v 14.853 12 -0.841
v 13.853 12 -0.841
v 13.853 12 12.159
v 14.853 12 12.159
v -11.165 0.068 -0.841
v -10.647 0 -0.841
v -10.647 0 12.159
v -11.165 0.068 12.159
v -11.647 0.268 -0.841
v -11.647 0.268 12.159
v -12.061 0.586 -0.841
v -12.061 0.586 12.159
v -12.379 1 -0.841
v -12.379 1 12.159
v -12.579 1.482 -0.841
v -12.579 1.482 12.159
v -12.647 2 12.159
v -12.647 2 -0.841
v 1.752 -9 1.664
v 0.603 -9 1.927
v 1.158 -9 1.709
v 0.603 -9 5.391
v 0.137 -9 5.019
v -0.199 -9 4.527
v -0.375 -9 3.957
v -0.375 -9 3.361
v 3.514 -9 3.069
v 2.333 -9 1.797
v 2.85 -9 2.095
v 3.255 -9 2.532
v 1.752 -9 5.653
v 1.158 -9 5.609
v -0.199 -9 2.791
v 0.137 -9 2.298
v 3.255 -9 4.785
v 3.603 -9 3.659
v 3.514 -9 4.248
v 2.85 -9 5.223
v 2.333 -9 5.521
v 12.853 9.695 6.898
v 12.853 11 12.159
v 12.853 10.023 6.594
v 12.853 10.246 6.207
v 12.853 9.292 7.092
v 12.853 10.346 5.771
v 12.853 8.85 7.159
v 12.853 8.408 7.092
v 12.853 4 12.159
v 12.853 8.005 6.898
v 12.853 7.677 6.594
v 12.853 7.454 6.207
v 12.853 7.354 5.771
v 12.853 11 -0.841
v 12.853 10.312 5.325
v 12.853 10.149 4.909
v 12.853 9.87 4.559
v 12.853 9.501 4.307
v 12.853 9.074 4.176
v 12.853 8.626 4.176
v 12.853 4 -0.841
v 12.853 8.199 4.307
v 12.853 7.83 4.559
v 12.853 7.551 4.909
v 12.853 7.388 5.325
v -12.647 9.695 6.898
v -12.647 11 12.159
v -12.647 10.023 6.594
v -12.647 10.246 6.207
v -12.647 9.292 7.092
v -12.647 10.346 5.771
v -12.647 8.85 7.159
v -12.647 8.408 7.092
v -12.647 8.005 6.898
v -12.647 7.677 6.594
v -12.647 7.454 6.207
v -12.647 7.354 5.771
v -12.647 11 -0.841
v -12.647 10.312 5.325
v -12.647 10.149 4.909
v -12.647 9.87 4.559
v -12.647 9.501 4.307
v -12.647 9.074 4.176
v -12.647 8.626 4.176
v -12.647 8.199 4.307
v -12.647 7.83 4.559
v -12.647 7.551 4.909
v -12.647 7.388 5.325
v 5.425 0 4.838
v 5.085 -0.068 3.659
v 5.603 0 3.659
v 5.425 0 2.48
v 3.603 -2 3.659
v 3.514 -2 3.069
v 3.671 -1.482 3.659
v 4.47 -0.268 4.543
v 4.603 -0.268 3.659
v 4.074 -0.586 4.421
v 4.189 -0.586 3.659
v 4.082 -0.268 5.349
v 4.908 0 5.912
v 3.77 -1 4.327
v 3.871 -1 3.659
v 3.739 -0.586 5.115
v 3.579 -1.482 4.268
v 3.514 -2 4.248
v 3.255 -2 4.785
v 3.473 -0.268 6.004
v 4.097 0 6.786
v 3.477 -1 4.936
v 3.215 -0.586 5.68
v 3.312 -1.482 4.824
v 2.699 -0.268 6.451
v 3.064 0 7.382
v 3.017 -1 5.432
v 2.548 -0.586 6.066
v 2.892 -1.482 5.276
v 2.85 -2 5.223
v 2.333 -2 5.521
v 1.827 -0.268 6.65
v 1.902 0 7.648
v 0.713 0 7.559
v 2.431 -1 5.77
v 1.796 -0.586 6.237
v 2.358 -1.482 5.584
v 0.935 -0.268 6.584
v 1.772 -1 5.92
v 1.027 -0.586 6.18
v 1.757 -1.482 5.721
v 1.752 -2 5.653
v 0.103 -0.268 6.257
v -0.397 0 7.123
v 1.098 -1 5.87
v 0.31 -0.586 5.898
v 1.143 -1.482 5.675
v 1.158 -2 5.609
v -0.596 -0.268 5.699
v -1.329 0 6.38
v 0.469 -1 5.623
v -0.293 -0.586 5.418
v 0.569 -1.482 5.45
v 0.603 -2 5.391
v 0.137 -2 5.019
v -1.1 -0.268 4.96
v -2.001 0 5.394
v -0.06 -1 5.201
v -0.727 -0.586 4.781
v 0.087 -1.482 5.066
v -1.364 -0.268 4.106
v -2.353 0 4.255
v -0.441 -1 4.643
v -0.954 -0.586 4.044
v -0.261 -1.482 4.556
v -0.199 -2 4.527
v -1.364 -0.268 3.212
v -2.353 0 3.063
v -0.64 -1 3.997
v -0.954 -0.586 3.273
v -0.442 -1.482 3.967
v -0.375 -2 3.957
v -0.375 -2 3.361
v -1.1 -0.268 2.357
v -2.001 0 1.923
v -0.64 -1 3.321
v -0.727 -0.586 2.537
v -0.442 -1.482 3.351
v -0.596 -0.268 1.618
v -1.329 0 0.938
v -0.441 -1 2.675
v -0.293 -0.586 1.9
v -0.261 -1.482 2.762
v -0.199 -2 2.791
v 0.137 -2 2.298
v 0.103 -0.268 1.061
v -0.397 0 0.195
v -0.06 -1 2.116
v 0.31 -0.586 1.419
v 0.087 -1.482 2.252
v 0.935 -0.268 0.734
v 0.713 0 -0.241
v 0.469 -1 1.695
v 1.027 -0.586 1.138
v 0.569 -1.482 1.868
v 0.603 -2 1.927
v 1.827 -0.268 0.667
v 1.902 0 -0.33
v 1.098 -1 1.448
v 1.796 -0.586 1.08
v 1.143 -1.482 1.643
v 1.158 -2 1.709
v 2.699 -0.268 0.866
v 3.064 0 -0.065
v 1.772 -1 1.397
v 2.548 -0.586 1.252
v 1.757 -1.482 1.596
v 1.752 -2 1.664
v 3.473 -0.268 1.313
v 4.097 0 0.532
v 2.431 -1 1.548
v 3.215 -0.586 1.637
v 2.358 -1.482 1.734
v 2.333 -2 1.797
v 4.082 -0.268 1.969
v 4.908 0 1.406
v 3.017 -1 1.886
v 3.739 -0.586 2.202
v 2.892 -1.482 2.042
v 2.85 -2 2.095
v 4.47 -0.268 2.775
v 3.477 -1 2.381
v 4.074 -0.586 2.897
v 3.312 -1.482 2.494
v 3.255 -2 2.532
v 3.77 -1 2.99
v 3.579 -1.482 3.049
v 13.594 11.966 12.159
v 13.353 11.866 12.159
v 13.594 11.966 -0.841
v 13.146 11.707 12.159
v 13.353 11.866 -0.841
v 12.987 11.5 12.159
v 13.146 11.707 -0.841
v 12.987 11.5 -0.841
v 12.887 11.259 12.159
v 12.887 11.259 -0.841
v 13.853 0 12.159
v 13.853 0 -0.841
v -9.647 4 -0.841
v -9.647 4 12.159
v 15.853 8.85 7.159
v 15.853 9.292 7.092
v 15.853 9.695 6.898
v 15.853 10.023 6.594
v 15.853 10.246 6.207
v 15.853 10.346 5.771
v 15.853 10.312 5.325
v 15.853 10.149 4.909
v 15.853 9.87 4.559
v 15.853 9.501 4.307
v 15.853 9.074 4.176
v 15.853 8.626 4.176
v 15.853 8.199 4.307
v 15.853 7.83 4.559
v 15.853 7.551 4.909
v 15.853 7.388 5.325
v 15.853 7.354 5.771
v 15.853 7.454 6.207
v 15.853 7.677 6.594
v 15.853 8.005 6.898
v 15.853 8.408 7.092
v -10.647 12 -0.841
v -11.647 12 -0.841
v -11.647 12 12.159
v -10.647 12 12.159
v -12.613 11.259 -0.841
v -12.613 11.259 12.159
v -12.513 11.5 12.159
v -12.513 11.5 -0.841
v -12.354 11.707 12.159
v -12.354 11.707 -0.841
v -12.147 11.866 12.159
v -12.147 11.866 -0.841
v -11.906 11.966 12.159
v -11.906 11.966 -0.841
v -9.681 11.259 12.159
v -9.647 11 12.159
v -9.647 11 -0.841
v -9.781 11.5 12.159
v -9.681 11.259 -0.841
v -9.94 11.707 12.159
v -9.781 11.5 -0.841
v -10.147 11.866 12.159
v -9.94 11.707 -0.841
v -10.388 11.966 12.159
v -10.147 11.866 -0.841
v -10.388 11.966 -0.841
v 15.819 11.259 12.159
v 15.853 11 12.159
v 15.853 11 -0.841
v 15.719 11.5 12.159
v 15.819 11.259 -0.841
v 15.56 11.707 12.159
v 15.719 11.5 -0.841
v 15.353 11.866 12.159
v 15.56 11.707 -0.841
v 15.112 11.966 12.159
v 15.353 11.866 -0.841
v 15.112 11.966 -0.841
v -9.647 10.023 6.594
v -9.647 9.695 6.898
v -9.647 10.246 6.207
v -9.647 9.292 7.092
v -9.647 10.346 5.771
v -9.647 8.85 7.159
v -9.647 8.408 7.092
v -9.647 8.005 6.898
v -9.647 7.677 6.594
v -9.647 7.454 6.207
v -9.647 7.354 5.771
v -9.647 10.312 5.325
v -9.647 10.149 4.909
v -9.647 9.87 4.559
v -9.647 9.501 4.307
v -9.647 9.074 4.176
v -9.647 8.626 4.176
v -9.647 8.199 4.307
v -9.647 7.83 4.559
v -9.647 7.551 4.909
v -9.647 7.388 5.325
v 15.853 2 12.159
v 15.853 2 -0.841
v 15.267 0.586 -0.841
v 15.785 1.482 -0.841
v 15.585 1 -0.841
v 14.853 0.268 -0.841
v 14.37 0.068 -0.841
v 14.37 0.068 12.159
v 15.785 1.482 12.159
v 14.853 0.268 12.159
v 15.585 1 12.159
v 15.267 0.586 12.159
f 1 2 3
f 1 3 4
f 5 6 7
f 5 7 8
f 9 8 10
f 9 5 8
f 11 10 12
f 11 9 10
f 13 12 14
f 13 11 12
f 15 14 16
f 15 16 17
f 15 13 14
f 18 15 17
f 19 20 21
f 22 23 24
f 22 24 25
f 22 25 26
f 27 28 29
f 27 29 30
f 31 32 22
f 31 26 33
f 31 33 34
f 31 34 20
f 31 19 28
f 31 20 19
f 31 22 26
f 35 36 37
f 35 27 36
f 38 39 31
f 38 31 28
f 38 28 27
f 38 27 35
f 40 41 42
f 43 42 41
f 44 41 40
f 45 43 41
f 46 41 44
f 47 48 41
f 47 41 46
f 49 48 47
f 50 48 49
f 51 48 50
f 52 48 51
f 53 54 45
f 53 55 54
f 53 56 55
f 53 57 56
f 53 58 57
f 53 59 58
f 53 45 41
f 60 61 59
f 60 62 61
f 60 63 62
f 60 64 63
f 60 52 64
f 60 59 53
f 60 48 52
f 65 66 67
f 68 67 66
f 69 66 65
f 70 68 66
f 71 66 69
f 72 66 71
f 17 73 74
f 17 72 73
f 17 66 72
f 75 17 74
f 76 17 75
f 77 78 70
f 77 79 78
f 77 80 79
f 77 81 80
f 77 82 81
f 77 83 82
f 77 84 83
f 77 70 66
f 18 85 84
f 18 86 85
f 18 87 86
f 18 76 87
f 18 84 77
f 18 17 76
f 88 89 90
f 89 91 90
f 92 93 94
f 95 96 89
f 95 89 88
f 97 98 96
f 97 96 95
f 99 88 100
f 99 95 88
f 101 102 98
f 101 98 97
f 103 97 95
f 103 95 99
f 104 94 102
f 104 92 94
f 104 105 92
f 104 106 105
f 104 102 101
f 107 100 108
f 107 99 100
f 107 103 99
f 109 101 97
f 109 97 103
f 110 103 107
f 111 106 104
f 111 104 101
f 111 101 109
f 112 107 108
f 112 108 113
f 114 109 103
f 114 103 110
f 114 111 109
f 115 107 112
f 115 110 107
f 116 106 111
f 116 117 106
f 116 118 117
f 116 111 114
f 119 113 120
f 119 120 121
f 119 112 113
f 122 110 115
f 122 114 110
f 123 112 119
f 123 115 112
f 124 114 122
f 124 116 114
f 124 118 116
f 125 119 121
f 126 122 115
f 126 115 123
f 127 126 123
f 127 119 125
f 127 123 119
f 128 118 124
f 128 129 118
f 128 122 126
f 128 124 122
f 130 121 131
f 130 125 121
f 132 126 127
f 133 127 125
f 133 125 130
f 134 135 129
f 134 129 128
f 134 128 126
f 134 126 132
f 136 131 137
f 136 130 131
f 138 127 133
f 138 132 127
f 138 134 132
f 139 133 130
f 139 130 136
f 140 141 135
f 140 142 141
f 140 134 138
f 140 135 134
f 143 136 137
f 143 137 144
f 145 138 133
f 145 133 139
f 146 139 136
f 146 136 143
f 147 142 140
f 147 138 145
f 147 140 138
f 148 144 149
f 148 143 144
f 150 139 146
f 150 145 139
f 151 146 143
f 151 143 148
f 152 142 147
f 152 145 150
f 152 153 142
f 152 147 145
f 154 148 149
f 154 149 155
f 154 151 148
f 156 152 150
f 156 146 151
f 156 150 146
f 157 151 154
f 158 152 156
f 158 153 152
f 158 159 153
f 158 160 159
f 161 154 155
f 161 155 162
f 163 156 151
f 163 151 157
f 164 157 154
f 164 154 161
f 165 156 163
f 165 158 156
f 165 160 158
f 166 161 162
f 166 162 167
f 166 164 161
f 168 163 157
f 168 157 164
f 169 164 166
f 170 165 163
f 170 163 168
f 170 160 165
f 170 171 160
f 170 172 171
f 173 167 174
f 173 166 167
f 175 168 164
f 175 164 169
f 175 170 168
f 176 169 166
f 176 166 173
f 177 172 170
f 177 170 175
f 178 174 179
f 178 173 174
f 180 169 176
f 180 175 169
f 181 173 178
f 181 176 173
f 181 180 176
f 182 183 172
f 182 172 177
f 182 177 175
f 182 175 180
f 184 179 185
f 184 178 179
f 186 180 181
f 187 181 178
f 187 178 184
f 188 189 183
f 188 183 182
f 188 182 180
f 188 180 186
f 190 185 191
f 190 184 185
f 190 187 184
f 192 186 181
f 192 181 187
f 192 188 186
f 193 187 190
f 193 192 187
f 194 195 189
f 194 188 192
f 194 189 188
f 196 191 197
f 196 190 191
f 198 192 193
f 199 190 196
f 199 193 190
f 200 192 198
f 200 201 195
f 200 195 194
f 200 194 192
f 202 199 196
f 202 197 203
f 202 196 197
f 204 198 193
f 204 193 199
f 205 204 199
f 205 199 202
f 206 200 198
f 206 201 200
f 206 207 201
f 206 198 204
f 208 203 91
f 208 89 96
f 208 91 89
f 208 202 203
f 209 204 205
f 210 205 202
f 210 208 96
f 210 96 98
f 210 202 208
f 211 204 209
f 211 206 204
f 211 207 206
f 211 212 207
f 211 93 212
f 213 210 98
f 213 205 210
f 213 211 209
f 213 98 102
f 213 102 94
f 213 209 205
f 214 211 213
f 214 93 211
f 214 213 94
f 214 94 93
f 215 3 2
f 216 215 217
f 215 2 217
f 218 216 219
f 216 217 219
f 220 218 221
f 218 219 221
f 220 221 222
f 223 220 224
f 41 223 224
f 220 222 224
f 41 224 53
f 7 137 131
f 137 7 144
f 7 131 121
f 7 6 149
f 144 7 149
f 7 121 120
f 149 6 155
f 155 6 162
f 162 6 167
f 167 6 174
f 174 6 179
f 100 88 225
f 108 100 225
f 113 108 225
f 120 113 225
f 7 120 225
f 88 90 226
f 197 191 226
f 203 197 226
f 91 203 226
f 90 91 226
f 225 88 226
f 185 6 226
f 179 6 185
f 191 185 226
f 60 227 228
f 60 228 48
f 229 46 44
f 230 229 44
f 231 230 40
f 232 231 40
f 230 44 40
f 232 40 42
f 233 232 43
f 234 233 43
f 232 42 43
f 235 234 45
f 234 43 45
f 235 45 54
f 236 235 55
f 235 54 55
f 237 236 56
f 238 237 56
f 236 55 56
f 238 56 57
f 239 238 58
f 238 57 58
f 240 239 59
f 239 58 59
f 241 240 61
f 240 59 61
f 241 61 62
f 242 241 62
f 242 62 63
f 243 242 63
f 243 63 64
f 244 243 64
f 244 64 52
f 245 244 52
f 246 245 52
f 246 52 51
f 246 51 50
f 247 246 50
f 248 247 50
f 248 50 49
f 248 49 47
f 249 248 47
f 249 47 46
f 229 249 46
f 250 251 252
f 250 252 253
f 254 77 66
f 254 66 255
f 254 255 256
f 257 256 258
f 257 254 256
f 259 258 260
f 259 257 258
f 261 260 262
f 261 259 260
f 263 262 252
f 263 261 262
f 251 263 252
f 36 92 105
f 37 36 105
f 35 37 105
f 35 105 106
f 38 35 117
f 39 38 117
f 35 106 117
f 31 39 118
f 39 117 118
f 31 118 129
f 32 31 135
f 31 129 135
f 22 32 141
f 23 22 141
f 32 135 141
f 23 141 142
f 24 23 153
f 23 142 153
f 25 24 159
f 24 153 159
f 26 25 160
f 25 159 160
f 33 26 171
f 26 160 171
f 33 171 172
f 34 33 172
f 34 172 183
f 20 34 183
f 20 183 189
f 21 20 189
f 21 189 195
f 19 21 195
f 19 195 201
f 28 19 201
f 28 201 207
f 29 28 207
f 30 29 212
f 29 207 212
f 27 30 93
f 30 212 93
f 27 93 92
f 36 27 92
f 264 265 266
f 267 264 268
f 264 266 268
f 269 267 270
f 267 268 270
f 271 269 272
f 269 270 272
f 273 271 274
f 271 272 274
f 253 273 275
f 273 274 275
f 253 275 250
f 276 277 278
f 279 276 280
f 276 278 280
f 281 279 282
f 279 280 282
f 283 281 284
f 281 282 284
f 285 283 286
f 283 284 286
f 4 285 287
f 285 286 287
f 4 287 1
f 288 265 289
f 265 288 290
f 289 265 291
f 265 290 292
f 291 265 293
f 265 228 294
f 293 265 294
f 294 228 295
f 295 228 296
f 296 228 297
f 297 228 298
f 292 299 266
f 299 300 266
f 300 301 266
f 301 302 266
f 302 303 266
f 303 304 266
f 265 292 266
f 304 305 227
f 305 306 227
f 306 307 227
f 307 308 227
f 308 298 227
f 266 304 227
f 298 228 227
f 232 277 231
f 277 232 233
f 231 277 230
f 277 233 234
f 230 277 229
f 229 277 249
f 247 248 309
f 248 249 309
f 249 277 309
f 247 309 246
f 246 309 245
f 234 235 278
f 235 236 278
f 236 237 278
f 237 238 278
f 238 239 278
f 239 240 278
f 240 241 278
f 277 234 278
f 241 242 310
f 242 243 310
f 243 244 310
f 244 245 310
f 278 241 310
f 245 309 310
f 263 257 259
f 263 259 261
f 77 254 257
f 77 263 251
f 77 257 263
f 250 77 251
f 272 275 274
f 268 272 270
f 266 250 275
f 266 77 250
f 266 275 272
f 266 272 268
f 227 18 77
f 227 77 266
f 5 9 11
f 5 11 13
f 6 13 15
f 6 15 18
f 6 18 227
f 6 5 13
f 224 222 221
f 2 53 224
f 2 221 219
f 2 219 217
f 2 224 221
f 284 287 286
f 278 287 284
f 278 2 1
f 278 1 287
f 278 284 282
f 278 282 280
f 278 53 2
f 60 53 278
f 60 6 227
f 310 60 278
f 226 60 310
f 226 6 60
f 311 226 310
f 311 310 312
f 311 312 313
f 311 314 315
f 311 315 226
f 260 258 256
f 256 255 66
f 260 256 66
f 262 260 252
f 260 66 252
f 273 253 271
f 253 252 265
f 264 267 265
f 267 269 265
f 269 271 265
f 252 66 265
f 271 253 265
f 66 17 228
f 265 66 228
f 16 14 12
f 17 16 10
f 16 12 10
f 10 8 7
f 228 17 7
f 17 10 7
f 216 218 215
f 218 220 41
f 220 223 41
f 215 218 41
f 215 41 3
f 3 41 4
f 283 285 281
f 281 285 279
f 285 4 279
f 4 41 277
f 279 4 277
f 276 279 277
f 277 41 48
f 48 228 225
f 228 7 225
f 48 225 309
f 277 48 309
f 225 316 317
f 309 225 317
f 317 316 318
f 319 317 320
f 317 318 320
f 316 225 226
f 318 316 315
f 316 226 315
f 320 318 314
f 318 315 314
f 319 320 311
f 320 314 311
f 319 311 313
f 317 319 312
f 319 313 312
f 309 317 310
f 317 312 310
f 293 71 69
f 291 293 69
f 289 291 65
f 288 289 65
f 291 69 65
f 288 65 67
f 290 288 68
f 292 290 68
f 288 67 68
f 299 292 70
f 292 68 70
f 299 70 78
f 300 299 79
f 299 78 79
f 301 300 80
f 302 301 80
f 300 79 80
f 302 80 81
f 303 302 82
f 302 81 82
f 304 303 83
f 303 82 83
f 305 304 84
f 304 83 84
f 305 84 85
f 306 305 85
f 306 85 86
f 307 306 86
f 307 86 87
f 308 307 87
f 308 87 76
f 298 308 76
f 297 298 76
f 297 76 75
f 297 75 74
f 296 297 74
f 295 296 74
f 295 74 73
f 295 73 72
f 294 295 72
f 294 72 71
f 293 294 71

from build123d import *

# Parameters (mm, degrees)
SKETCH1_W           = 28.5
SKETCH1_H           = 17
BOSS_EXTRUDE1_DEPTH = 4
SKETCH2_W           = 3
SKETCH2_H           = 17
BOSS_EXTRUDE2_DEPTH = 8
SKETCH3_R           = 1.5
CUT_EXTRUDE1_DEPTH  = 29.5
SKETCH4_R           = 2
BOSS_EXTRUDE3_DEPTH = 9
FILLET1_R           = 2
FILLET2_R           = 2
FILLET3_R           = 1
SKETCH5_W           = 36.717008867
SKETCH5_H           = 6.82374105
CUT_EXTRUDE2_DEPTH  = 12


with BuildPart() as part:
    # Sketch1 → Boss-Extrude1 (new body)
    with BuildSketch(Plane(origin=(0, 0, 0), x_dir=(1, 0, 0), z_dir=(0, 1, 0))):
        with Locations((1.602817149, -3.658837531)):
            Rectangle(SKETCH1_W, SKETCH1_H)
    extrude(amount=BOSS_EXTRUDE1_DEPTH)

    # Sketch2 → Boss-Extrude2 (add)
    with BuildSketch(Plane(origin=(0, 4, 0), x_dir=(1, 0, 0), z_dir=(0, 1, 0))):
        with Locations((-11.147182851, -3.658837531)):
            Rectangle(SKETCH2_W, SKETCH2_H)
        with Locations((14.352817149, -3.658837531)):
            Rectangle(SKETCH2_W, SKETCH2_H)
    extrude(amount=BOSS_EXTRUDE2_DEPTH)

    # Sketch3 → Cut-Extrude1 (cut, through all)
    with BuildSketch(Plane.ZY.offset(12.647182851)):
        with Locations((5.658837531, 8.85)):
            Circle(SKETCH3_R)
    extrude(amount=-CUT_EXTRUDE1_DEPTH, mode=Mode.SUBTRACT)

    # Sketch4 → Boss-Extrude3 (add)
    with BuildSketch(Plane.XZ):
        with Locations((1.602817149, 3.658837531)):
            Circle(SKETCH4_R)
    extrude(amount=BOSS_EXTRUDE3_DEPTH)

    # Fillet1
    fillet1_edges = [part.edges().sort_by_distance(p)[0] for p in [
        (-0.397182851, 0, 3.658837531),
    ]]
    fillet(fillet1_edges, radius=FILLET1_R)

    # Fillet2
    fillet2_edges = [part.edges().sort_by_distance(p)[0] for p in [
        (15.852817149, 0, 3.658837531),
        (-12.647182851, 0, 3.658837531),
    ]]
    fillet(fillet2_edges, radius=FILLET2_R)

    # Fillet3
    fillet3_edges = [part.edges().sort_by_distance(p)[0] for p in [
        (-12.647182851, 12, 3.658837531),
        (-9.647182851, 12, 3.658837531),
        (15.852817149, 12, 3.658837531),
        (12.852817149, 12, 3.658837531),
    ]]
    fillet(fillet3_edges, radius=FILLET3_R)

    # Sketch5 → Cut-Extrude2 (cut)
    with BuildSketch(Plane.XZ):
        with Locations((1.100738545, -4.253032994)):
            Rectangle(SKETCH5_W, SKETCH5_H)
    extrude(amount=-CUT_EXTRUDE2_DEPTH, mode=Mode.SUBTRACT)


solid = part.part
